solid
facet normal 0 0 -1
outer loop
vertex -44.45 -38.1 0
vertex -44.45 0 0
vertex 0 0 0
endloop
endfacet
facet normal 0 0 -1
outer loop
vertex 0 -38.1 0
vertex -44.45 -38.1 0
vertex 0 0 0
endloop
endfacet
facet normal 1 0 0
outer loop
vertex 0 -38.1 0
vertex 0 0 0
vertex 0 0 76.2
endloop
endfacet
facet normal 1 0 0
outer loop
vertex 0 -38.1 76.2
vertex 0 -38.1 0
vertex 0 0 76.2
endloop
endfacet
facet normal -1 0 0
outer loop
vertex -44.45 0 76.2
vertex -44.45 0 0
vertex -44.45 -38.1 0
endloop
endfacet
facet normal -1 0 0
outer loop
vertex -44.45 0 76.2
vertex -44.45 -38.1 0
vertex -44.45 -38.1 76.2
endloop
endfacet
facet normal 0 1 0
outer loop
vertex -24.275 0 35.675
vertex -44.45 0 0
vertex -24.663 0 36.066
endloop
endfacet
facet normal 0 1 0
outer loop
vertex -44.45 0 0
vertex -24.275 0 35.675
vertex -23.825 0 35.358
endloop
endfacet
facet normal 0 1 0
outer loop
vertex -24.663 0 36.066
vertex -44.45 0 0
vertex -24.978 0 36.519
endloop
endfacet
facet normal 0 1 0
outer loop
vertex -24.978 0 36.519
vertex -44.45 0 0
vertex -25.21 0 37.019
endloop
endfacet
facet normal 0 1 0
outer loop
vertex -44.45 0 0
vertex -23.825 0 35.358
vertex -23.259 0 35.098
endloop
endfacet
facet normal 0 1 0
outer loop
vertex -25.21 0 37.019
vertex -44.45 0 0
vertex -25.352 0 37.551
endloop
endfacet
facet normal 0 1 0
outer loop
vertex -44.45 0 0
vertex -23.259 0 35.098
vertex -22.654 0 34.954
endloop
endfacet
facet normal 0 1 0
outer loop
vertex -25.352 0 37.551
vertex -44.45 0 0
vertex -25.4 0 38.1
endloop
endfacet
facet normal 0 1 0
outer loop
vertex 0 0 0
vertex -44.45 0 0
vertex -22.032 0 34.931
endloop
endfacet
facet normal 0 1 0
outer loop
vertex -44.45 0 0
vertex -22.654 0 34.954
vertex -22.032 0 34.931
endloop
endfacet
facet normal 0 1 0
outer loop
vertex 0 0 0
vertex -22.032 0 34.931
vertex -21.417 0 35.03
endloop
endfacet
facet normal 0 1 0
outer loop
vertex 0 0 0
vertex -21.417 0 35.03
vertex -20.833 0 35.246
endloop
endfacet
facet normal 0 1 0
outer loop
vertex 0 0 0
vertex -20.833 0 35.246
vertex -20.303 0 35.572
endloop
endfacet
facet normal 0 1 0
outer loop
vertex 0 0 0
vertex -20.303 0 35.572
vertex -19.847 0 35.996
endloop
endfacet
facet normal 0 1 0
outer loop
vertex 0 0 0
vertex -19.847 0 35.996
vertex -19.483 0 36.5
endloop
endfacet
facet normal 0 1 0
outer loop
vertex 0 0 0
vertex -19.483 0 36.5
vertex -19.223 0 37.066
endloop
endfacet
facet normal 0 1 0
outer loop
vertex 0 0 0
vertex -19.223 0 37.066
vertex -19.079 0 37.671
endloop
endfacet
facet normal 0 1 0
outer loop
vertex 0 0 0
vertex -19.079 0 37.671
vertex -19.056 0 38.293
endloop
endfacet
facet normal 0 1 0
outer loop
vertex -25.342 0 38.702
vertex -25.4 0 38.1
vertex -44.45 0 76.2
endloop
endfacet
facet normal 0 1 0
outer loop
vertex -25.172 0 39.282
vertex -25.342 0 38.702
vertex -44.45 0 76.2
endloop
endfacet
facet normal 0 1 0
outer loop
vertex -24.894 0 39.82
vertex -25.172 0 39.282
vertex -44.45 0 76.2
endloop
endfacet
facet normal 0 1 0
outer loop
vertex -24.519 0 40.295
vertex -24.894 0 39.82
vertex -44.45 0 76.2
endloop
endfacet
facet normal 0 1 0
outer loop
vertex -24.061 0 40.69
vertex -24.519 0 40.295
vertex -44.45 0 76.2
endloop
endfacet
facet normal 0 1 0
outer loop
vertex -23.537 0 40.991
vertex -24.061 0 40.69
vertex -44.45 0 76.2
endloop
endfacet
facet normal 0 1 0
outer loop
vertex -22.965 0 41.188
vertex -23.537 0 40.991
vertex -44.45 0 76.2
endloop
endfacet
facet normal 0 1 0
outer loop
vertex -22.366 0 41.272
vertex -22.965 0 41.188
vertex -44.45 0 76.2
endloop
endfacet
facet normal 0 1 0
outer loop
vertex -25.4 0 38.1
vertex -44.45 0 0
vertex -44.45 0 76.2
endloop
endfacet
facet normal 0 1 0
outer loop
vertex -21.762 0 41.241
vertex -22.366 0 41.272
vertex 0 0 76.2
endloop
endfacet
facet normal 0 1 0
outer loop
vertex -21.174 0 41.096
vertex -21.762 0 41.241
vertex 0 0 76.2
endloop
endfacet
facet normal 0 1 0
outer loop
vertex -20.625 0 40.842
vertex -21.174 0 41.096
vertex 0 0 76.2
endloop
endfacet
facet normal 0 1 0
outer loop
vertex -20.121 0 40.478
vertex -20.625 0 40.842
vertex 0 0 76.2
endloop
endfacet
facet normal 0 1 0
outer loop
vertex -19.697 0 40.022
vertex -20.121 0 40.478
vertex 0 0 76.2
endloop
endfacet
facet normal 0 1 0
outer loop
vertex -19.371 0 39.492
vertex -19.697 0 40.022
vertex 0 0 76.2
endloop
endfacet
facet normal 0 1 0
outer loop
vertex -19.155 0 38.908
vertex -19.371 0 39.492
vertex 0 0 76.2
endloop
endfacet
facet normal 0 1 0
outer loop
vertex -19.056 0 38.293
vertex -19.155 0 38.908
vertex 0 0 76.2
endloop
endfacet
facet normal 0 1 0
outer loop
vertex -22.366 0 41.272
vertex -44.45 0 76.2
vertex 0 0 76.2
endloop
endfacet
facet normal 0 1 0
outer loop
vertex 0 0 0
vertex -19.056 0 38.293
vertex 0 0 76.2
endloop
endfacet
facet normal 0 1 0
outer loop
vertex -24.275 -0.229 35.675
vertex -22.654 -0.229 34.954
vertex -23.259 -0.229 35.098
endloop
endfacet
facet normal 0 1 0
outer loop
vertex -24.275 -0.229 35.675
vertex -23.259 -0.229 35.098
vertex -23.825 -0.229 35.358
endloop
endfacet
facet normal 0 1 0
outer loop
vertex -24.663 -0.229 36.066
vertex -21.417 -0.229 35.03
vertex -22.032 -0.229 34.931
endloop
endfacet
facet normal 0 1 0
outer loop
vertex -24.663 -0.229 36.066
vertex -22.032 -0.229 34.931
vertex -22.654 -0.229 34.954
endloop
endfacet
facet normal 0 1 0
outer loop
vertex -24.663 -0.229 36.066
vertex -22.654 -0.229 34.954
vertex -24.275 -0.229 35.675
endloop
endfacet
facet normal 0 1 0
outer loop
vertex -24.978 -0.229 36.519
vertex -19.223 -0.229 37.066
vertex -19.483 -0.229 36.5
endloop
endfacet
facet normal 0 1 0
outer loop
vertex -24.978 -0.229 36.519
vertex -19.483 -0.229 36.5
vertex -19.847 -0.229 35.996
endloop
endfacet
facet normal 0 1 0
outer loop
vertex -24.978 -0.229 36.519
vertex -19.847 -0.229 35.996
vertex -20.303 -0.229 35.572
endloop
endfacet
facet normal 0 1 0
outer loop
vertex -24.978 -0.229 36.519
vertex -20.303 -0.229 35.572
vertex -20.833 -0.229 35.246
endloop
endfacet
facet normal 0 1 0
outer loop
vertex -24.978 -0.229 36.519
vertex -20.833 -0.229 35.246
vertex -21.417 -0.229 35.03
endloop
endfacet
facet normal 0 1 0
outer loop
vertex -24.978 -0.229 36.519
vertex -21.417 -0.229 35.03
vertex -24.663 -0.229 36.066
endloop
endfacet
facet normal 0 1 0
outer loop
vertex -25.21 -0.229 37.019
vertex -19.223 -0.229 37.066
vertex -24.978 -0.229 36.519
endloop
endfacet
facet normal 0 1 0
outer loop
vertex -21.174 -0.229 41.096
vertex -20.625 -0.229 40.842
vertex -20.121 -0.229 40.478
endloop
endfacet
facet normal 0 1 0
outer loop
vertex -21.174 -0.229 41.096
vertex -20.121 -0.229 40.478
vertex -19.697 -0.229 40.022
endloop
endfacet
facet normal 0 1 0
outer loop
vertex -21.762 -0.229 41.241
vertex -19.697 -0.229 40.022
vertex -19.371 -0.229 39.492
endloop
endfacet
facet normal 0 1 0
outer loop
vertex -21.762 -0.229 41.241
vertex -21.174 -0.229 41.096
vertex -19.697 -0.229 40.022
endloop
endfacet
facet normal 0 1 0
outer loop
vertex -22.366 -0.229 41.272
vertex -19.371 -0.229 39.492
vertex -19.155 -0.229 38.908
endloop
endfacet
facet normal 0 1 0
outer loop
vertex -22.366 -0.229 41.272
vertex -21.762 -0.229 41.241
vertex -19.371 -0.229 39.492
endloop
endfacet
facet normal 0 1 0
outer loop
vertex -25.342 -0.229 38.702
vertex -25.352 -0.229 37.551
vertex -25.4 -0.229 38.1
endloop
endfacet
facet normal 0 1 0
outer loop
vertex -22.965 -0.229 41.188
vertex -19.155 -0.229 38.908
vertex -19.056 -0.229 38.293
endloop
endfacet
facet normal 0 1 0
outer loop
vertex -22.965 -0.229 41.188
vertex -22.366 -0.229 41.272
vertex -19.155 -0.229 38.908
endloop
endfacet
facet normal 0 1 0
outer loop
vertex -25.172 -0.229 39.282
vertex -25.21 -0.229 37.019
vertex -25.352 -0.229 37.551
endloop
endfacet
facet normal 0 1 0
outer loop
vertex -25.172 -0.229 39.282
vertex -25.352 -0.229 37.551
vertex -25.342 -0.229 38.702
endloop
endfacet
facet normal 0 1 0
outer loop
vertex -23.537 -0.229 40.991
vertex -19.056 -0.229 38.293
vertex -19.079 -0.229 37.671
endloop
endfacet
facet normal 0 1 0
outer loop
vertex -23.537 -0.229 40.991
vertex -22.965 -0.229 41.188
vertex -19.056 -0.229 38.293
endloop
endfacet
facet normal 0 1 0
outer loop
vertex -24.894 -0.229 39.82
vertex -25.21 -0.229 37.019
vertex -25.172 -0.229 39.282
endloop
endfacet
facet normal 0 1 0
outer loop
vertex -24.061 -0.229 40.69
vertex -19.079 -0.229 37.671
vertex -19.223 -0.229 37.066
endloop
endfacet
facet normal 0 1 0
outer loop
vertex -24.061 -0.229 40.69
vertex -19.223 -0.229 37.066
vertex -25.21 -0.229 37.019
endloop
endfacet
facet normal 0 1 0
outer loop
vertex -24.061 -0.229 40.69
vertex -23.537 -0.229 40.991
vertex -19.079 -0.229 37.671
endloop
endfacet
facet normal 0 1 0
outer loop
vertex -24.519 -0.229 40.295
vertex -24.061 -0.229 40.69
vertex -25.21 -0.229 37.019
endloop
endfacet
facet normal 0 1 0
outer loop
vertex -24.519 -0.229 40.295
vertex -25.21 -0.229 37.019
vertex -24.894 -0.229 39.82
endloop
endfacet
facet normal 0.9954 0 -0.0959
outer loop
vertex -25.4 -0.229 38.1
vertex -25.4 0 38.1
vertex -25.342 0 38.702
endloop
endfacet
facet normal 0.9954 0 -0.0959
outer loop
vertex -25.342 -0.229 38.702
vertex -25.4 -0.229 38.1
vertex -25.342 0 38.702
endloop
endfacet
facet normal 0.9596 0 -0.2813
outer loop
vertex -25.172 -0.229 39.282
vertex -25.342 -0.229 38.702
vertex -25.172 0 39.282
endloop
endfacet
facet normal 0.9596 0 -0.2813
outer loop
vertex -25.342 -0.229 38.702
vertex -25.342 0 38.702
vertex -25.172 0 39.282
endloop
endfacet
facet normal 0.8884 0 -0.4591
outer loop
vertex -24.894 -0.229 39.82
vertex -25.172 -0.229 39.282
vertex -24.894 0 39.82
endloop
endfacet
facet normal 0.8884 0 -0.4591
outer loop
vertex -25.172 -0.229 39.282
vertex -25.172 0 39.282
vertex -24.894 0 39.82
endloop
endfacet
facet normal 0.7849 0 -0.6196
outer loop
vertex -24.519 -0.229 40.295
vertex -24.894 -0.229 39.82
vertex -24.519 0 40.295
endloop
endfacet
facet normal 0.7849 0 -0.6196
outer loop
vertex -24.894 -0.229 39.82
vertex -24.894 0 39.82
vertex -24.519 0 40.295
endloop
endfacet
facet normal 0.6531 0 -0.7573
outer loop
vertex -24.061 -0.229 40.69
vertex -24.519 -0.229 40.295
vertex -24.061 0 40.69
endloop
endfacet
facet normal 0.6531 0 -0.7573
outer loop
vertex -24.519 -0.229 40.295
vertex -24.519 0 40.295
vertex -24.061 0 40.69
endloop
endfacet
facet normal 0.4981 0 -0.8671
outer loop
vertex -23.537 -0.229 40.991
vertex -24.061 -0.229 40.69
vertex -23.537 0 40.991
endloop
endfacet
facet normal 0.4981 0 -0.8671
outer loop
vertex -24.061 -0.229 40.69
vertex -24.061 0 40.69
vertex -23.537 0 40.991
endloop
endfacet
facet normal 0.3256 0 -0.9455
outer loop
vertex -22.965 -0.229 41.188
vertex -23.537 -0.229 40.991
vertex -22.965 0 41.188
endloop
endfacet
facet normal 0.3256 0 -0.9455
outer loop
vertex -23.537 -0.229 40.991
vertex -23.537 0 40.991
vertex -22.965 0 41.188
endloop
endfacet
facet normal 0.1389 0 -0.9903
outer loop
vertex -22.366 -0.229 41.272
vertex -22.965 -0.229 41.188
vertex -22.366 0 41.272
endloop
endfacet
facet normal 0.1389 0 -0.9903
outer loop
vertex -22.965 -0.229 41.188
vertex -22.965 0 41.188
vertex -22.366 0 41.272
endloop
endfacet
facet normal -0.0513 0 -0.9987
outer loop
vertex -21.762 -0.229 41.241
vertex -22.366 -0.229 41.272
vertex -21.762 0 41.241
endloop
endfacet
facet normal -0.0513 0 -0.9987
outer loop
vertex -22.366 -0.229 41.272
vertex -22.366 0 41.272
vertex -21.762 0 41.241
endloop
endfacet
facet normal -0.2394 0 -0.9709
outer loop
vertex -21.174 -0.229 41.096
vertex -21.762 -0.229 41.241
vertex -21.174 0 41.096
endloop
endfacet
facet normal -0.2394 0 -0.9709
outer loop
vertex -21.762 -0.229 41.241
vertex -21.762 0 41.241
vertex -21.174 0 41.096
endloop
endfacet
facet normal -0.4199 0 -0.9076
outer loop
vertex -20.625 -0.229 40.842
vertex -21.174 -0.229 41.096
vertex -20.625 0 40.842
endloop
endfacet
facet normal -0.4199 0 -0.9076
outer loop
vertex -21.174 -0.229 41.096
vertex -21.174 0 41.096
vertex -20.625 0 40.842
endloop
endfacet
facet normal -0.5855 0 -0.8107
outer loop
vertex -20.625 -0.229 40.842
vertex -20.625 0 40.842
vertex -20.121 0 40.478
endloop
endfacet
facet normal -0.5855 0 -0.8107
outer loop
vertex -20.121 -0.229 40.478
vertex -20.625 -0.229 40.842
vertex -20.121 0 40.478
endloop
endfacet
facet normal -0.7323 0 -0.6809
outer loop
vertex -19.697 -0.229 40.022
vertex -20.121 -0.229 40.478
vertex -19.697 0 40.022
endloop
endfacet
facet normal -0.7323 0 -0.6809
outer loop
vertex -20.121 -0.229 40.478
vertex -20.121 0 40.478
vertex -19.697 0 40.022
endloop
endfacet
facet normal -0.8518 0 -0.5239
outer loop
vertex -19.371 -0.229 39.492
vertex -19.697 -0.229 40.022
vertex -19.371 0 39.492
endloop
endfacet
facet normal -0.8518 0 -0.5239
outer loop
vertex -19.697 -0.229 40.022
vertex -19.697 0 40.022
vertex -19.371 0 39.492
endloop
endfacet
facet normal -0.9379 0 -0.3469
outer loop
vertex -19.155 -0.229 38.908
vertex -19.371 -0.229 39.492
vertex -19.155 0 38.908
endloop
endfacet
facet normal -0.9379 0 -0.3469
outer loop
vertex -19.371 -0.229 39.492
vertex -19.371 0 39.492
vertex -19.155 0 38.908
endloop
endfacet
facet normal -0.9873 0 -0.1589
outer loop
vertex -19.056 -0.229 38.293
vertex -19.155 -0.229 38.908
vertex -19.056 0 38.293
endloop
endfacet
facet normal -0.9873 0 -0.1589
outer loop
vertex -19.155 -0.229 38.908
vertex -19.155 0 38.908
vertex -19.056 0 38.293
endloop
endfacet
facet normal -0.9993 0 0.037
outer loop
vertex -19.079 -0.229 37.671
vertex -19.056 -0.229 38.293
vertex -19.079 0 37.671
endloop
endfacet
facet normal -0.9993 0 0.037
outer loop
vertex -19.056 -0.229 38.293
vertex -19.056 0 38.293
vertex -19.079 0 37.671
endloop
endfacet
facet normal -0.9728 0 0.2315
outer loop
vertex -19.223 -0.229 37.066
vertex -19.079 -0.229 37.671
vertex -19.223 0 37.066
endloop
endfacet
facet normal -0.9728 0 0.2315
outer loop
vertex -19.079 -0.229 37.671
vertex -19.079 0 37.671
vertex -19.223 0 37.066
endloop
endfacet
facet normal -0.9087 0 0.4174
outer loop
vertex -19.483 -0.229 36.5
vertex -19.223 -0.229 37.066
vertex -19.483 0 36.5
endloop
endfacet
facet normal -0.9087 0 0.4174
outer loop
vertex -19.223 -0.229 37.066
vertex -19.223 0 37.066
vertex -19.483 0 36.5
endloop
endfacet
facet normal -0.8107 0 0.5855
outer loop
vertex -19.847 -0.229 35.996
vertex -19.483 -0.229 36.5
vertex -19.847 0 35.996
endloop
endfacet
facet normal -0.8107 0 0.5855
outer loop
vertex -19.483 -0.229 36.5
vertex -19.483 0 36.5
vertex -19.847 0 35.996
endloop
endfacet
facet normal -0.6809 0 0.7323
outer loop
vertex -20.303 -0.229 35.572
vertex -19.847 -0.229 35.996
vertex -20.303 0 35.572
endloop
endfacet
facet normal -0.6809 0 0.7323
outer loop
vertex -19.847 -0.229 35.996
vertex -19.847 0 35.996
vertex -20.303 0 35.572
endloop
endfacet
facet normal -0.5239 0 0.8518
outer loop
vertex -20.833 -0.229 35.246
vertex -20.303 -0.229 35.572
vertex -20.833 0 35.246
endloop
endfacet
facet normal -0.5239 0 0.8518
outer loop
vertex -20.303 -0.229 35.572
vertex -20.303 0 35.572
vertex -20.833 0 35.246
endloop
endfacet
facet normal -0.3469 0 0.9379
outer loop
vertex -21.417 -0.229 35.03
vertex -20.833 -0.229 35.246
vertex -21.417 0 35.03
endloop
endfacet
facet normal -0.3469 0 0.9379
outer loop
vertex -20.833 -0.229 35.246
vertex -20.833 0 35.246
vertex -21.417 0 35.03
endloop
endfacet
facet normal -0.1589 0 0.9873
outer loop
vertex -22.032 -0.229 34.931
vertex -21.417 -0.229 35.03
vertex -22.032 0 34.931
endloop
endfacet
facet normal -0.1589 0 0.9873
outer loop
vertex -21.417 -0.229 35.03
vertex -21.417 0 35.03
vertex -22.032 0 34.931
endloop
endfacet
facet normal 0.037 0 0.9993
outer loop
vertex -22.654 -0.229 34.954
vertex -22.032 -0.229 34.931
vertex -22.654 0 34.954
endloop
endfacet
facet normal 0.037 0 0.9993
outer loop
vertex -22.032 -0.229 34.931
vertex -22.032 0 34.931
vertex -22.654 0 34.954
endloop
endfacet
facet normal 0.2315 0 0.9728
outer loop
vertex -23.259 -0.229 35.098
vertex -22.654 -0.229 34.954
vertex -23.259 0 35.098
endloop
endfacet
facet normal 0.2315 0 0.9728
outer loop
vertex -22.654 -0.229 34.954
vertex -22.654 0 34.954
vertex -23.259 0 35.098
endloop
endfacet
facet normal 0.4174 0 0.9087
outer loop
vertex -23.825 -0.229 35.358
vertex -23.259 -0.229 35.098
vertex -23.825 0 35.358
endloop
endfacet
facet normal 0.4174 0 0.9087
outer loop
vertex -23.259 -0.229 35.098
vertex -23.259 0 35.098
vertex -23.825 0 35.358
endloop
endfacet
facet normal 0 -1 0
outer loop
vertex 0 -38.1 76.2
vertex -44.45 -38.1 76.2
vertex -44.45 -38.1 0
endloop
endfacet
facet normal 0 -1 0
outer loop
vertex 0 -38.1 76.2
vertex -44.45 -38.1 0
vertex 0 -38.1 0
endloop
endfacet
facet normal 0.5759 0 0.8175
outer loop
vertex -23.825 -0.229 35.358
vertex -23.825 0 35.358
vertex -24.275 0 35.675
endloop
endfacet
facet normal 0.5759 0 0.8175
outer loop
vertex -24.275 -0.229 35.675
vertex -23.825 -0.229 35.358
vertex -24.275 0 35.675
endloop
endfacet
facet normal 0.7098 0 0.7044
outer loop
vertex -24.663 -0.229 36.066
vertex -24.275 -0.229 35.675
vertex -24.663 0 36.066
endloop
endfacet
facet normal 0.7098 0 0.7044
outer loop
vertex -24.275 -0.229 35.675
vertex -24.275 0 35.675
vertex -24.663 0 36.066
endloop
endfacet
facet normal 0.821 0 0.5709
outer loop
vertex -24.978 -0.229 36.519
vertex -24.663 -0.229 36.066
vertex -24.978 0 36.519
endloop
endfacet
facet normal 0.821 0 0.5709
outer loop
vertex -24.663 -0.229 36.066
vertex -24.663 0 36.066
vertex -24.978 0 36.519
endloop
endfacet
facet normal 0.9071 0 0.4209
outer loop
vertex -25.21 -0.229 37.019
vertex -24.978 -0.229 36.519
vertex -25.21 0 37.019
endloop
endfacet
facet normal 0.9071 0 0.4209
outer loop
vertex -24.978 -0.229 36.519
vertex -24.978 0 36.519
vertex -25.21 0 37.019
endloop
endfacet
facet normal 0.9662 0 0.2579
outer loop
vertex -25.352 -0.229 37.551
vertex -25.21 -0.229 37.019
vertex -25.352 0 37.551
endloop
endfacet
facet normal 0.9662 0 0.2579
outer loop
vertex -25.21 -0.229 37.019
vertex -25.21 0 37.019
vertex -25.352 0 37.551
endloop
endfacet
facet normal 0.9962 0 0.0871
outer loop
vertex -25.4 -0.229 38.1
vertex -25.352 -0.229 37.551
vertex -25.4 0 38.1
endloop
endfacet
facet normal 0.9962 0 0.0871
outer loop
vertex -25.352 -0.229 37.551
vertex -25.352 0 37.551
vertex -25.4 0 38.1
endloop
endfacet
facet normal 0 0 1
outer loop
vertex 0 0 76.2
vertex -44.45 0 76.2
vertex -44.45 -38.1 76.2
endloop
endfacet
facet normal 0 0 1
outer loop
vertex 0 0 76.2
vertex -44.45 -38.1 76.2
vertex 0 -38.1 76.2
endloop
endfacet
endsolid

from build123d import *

# Parameters (mm, degrees)
F0_W     = 44.45
F0_H     = 76.2
F1_DEPTH = 38.1
F3_DEPTH = 0.2286


with BuildPart() as f1:
    # F0 (on Front) → F1 (new body)
    with BuildSketch(Plane.XZ):
        with Locations((-22.225, 38.1)):
            Rectangle(F0_W, F0_H)
    extrude(amount=F1_DEPTH)

    # F2 (on face) → F3 (cut)
    with BuildSketch(Plane(origin=(0, 0, 0), x_dir=(-1, 0, 0), z_dir=(0, 1, 0))):
        with BuildLine():
            ThreePointArc((25.4, 38.1), (23.8063428065, 40.8531763344), (20.625209494, 40.8424980104))
            Line((20.625209494, 40.8424980104), (23.824790506, 35.3575019896))
            ThreePointArc((23.824790506, 35.3575019896), (24.9781763344, 36.5186571935), (25.4, 38.1))
        make_face()
        with BuildLine():
            Line((23.824790506, 35.3575019896), (20.625209494, 40.8424980104))
            ThreePointArc((20.625209494, 40.8424980104), (19.4825019896, 36.500209494), (23.824790506, 35.3575019896))
        make_face()
    extrude(amount=-F3_DEPTH, mode=Mode.SUBTRACT)


solid = f1.part
